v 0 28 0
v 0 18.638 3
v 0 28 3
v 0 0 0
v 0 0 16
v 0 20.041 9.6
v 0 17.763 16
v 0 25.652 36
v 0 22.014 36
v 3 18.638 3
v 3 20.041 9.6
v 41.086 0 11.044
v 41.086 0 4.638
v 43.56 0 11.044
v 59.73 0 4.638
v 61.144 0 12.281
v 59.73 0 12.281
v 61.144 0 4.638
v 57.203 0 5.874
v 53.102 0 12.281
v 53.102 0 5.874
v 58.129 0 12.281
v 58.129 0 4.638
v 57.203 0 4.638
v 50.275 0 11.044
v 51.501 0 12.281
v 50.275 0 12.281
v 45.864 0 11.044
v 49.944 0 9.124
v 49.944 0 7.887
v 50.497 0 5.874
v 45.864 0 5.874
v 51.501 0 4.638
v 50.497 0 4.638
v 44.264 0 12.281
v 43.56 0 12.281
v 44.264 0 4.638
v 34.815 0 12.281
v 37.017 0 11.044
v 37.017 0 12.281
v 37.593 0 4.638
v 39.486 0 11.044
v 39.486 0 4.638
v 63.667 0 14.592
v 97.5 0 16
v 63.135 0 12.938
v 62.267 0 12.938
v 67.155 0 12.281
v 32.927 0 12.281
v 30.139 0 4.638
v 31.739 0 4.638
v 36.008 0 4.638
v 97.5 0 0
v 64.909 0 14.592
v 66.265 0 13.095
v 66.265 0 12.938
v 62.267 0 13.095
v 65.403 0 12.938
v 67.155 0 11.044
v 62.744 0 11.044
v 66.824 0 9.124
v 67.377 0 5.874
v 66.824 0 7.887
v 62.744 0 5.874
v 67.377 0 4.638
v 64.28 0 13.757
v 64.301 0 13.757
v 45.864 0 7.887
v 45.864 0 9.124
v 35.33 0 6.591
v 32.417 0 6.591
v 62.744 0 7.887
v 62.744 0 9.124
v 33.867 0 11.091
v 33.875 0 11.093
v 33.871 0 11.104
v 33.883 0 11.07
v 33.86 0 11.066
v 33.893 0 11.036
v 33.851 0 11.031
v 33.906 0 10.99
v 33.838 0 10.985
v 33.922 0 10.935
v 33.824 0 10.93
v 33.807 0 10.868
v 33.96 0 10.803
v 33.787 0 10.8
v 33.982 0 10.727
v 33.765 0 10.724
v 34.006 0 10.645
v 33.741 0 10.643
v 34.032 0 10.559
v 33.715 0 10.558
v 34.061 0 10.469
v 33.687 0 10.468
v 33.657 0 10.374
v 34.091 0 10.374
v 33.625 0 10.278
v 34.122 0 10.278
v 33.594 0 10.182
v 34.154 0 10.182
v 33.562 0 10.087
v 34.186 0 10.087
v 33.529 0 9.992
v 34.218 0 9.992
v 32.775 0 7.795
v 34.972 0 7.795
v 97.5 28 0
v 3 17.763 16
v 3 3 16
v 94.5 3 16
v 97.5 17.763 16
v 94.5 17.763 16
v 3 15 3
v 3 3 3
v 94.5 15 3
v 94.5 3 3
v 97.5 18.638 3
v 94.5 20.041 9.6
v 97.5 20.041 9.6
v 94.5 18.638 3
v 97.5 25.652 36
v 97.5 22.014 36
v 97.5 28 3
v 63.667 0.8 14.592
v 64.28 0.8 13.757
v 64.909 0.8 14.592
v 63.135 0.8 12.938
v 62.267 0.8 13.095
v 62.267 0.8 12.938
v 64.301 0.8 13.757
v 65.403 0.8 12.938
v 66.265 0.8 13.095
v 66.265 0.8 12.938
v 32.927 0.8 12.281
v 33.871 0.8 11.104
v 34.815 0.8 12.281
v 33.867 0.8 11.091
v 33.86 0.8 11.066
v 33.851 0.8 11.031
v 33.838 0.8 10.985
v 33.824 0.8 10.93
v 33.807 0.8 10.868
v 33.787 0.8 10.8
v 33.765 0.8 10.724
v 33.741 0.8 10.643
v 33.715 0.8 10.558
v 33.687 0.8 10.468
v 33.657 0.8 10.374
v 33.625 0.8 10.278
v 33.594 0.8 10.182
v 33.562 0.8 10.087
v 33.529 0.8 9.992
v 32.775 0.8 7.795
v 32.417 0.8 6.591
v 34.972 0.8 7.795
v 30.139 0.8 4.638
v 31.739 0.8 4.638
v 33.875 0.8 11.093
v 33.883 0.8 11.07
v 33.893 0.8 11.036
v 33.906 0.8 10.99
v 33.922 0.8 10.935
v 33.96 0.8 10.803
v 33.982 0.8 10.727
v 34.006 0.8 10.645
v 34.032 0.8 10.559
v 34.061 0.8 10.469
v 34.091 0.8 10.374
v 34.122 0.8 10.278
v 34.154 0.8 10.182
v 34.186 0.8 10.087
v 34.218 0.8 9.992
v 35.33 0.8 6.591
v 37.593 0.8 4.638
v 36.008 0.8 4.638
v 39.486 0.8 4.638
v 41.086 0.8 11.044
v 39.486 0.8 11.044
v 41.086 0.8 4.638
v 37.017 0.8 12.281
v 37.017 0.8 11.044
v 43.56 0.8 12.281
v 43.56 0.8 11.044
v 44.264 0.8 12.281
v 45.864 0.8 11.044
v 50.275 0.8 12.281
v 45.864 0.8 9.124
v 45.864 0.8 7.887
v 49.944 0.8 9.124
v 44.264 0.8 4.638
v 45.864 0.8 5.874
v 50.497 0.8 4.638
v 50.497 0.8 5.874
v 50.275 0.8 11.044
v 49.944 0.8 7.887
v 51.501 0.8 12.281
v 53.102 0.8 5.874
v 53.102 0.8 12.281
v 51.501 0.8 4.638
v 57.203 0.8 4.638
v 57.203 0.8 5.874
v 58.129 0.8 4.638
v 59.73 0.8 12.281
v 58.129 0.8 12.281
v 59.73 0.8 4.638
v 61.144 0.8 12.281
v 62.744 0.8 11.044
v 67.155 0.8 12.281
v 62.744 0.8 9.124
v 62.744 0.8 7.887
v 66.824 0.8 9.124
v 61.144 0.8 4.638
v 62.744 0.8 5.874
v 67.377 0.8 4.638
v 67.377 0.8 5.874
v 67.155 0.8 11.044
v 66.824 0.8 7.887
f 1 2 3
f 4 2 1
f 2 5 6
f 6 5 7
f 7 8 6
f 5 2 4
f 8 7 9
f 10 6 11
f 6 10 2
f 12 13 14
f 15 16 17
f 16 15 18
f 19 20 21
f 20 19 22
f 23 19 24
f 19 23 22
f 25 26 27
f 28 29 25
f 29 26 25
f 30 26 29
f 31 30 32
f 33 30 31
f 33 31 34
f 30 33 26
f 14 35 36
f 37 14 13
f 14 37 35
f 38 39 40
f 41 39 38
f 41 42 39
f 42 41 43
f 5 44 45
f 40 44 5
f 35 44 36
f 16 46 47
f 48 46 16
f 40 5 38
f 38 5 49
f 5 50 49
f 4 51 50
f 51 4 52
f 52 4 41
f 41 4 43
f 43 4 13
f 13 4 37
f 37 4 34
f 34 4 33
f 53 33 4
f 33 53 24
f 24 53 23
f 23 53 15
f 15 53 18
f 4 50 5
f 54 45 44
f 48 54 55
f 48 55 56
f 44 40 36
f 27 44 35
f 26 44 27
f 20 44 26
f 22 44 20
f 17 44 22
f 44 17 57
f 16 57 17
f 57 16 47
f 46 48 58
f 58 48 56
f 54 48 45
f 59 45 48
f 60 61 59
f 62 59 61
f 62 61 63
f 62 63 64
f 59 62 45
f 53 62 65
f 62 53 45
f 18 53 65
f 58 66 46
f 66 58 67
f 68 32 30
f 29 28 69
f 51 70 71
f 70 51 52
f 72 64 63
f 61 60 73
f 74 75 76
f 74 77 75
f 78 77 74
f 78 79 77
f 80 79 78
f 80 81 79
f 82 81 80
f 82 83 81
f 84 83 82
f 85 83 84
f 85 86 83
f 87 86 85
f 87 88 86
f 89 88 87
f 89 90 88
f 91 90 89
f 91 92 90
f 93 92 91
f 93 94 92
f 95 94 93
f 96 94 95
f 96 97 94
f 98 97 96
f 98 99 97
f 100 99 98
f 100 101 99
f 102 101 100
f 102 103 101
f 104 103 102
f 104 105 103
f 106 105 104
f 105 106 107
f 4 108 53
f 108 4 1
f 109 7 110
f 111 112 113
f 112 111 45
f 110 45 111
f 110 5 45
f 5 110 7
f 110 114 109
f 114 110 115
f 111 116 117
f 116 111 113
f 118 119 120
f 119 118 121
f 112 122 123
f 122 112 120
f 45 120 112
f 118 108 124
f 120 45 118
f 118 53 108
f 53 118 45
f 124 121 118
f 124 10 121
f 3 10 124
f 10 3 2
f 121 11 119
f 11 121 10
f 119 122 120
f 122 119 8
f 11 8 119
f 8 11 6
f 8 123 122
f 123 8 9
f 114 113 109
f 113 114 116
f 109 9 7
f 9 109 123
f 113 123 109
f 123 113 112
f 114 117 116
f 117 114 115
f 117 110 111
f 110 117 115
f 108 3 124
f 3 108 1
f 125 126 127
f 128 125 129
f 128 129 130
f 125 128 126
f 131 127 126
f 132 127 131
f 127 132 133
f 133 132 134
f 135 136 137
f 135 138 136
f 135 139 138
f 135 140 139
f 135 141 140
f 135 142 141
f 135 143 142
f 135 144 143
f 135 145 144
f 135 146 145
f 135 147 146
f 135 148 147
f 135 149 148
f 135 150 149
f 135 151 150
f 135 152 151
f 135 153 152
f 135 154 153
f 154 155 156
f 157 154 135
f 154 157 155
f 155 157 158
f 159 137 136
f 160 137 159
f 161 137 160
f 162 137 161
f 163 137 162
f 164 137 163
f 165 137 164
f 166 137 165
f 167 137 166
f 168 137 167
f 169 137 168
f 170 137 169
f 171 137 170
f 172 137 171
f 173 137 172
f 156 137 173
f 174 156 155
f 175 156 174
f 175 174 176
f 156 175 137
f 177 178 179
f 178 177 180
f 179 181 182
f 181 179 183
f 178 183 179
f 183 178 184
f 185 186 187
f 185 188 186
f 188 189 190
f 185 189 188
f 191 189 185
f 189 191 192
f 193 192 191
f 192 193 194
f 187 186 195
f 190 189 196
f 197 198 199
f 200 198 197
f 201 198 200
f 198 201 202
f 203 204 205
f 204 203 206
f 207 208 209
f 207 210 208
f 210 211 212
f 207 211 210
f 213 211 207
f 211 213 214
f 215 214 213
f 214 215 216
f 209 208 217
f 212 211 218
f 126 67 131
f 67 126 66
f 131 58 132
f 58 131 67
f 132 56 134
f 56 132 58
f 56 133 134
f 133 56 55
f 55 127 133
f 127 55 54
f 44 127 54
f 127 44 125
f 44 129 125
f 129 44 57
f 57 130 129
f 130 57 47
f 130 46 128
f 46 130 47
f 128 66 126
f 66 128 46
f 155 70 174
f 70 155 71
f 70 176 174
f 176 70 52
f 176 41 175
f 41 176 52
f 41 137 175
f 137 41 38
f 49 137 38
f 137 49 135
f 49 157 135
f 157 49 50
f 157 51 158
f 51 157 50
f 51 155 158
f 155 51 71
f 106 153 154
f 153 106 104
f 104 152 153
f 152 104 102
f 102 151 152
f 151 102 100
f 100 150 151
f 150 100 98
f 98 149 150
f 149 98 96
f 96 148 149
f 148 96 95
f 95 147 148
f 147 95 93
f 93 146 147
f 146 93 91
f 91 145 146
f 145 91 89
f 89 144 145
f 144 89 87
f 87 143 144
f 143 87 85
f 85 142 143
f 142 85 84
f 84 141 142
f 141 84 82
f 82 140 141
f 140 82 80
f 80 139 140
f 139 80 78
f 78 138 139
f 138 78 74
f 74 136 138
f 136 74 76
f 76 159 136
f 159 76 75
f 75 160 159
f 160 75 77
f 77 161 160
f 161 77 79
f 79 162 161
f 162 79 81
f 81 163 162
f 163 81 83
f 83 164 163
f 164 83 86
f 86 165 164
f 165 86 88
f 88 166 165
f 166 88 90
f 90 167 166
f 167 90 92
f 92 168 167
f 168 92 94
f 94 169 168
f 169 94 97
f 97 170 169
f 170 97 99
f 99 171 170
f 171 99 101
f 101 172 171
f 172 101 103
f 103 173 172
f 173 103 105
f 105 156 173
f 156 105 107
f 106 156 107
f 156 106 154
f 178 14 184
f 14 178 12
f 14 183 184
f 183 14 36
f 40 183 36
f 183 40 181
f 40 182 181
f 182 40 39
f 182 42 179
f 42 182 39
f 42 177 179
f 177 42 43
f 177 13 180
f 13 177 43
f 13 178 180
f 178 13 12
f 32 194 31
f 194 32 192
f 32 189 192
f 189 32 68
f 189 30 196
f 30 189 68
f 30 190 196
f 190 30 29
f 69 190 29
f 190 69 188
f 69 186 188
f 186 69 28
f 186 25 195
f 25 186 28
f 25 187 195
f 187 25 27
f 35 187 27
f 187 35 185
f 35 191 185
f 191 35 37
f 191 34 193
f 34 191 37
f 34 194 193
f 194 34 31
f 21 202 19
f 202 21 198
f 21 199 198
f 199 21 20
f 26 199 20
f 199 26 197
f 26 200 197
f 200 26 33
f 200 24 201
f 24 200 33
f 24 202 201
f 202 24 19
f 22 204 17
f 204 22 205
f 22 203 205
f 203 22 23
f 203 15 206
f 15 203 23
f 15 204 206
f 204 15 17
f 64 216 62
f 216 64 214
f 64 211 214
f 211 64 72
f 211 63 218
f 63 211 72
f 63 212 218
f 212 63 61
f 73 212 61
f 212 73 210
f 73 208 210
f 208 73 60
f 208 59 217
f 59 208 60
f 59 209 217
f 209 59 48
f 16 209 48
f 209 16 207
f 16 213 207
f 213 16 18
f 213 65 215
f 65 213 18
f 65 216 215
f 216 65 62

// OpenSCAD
// porta-cartao.scad
// Porta-cartao de mesa para impressao 3D (banca de feira, balcao, loja).
// Oficina de sabado do I EECri 2026 (07/11/2026), demonstracao de IA para 3D.
// OpenSCAD 2021.01, sem bibliotecas. Unidades em milimetros.
//
// Imprime apoiado na base, sem suporte: a frente e vertical e o
// encosto inclina tilt graus para tras (inclinacao pequena, sem balanco).
// O texto e gravado (afundado) na frente.
//
// Exportar:
//   openscad -o porta-cartao.stl porta-cartao.scad
//   openscad -D 'label="DOCES DA ANA"' -o porta-cartao-ana.stl porta-cartao.scad
// Depois: abrir o STL no fatiador da impressora e fatiar com o material do laboratorio.

// ---------- Parametros ----------
card_width  = 90;    // largura do cartao, mm (cartao de visita comum: 90 x 50)
clearance   = 1.5;   // folga total na largura do bolso, mm
stack       = 12;    // espessura da pilha de cartoes que cabe no bolso, mm
wall        = 3;     // espessura das paredes, mm
base        = 3;     // espessura do fundo, mm
front_height = 16;   // altura da frente, mm
back_height = 36;    // altura do encosto, mm
tilt        = 12;    // inclinacao do encosto para tras, graus
foot        = 10;    // pe atras do encosto, para nao tombar, mm
label       = "ATELIÊ";  // texto gravado na frente ("" = sem texto)
font_size   = 8;     // tamanho desejado das letras, mm
bold        = true;  // negrito
text_depth  = 0.8;   // profundidade da gravacao do texto, mm
text_margin = 6;     // margem lateral do texto, mm

// ---------- Contas ----------
t = tan(tilt);
inner_w = card_width + clearance;          // largura do bolso
total_w = inner_w + 2 * wall;              // largura total
total_d = 2 * wall + stack + foot;         // profundidade da base
text_w  = total_w - 2 * text_margin;       // largura livre para o texto
size_final = len(label) > 0 ? min(font_size, text_w / len(label)) : 0;
font = bold ? "Liberation Sans:style=Bold" : "Liberation Sans";

echo(str("porta-cartao: ", total_w, " x ", total_d, " x ", back_height, " mm (largura x profundidade x altura)"));
echo(str("bolso: ", inner_w, " mm de largura, ", stack, " mm de pilha; texto com tamanho ", size_final));

// perfil lateral (Y para tras, Z para cima), ja com o bolso
module profile() {
    polygon([
        [0, 0],
        [total_d, 0],
        [total_d, base],
        [2 * wall + stack + t * base, base],
        [2 * wall + stack + t * back_height, back_height],
        [wall + stack + t * (back_height - base), back_height],
        [wall + stack, base],
        [wall, base],
        [wall, front_height],
        [0, front_height]
    ]);
}

// laterais: fecham o bolso ate a altura da frente
module cheek_profile() {
    polygon([
        [0, 0],
        [2 * wall + stack, 0],
        [2 * wall + stack + t * front_height, front_height],
        [0, front_height]
    ]);
}

module body() {
    rotate([90, 0, 90]) linear_extrude(height = total_w) profile();
    for (x = [0, total_w - wall])
        translate([x, 0, 0]) rotate([90, 0, 90]) linear_extrude(height = wall) cheek_profile();
}

difference() {
    body();
    if (len(label) > 0)
        translate([total_w / 2, text_depth, front_height / 2 + base / 2])
            rotate([90, 0, 0])
                linear_extrude(height = text_depth + 1)
                    text(label, size = size_final, font = font, halign = "center", valign = "center");
}
